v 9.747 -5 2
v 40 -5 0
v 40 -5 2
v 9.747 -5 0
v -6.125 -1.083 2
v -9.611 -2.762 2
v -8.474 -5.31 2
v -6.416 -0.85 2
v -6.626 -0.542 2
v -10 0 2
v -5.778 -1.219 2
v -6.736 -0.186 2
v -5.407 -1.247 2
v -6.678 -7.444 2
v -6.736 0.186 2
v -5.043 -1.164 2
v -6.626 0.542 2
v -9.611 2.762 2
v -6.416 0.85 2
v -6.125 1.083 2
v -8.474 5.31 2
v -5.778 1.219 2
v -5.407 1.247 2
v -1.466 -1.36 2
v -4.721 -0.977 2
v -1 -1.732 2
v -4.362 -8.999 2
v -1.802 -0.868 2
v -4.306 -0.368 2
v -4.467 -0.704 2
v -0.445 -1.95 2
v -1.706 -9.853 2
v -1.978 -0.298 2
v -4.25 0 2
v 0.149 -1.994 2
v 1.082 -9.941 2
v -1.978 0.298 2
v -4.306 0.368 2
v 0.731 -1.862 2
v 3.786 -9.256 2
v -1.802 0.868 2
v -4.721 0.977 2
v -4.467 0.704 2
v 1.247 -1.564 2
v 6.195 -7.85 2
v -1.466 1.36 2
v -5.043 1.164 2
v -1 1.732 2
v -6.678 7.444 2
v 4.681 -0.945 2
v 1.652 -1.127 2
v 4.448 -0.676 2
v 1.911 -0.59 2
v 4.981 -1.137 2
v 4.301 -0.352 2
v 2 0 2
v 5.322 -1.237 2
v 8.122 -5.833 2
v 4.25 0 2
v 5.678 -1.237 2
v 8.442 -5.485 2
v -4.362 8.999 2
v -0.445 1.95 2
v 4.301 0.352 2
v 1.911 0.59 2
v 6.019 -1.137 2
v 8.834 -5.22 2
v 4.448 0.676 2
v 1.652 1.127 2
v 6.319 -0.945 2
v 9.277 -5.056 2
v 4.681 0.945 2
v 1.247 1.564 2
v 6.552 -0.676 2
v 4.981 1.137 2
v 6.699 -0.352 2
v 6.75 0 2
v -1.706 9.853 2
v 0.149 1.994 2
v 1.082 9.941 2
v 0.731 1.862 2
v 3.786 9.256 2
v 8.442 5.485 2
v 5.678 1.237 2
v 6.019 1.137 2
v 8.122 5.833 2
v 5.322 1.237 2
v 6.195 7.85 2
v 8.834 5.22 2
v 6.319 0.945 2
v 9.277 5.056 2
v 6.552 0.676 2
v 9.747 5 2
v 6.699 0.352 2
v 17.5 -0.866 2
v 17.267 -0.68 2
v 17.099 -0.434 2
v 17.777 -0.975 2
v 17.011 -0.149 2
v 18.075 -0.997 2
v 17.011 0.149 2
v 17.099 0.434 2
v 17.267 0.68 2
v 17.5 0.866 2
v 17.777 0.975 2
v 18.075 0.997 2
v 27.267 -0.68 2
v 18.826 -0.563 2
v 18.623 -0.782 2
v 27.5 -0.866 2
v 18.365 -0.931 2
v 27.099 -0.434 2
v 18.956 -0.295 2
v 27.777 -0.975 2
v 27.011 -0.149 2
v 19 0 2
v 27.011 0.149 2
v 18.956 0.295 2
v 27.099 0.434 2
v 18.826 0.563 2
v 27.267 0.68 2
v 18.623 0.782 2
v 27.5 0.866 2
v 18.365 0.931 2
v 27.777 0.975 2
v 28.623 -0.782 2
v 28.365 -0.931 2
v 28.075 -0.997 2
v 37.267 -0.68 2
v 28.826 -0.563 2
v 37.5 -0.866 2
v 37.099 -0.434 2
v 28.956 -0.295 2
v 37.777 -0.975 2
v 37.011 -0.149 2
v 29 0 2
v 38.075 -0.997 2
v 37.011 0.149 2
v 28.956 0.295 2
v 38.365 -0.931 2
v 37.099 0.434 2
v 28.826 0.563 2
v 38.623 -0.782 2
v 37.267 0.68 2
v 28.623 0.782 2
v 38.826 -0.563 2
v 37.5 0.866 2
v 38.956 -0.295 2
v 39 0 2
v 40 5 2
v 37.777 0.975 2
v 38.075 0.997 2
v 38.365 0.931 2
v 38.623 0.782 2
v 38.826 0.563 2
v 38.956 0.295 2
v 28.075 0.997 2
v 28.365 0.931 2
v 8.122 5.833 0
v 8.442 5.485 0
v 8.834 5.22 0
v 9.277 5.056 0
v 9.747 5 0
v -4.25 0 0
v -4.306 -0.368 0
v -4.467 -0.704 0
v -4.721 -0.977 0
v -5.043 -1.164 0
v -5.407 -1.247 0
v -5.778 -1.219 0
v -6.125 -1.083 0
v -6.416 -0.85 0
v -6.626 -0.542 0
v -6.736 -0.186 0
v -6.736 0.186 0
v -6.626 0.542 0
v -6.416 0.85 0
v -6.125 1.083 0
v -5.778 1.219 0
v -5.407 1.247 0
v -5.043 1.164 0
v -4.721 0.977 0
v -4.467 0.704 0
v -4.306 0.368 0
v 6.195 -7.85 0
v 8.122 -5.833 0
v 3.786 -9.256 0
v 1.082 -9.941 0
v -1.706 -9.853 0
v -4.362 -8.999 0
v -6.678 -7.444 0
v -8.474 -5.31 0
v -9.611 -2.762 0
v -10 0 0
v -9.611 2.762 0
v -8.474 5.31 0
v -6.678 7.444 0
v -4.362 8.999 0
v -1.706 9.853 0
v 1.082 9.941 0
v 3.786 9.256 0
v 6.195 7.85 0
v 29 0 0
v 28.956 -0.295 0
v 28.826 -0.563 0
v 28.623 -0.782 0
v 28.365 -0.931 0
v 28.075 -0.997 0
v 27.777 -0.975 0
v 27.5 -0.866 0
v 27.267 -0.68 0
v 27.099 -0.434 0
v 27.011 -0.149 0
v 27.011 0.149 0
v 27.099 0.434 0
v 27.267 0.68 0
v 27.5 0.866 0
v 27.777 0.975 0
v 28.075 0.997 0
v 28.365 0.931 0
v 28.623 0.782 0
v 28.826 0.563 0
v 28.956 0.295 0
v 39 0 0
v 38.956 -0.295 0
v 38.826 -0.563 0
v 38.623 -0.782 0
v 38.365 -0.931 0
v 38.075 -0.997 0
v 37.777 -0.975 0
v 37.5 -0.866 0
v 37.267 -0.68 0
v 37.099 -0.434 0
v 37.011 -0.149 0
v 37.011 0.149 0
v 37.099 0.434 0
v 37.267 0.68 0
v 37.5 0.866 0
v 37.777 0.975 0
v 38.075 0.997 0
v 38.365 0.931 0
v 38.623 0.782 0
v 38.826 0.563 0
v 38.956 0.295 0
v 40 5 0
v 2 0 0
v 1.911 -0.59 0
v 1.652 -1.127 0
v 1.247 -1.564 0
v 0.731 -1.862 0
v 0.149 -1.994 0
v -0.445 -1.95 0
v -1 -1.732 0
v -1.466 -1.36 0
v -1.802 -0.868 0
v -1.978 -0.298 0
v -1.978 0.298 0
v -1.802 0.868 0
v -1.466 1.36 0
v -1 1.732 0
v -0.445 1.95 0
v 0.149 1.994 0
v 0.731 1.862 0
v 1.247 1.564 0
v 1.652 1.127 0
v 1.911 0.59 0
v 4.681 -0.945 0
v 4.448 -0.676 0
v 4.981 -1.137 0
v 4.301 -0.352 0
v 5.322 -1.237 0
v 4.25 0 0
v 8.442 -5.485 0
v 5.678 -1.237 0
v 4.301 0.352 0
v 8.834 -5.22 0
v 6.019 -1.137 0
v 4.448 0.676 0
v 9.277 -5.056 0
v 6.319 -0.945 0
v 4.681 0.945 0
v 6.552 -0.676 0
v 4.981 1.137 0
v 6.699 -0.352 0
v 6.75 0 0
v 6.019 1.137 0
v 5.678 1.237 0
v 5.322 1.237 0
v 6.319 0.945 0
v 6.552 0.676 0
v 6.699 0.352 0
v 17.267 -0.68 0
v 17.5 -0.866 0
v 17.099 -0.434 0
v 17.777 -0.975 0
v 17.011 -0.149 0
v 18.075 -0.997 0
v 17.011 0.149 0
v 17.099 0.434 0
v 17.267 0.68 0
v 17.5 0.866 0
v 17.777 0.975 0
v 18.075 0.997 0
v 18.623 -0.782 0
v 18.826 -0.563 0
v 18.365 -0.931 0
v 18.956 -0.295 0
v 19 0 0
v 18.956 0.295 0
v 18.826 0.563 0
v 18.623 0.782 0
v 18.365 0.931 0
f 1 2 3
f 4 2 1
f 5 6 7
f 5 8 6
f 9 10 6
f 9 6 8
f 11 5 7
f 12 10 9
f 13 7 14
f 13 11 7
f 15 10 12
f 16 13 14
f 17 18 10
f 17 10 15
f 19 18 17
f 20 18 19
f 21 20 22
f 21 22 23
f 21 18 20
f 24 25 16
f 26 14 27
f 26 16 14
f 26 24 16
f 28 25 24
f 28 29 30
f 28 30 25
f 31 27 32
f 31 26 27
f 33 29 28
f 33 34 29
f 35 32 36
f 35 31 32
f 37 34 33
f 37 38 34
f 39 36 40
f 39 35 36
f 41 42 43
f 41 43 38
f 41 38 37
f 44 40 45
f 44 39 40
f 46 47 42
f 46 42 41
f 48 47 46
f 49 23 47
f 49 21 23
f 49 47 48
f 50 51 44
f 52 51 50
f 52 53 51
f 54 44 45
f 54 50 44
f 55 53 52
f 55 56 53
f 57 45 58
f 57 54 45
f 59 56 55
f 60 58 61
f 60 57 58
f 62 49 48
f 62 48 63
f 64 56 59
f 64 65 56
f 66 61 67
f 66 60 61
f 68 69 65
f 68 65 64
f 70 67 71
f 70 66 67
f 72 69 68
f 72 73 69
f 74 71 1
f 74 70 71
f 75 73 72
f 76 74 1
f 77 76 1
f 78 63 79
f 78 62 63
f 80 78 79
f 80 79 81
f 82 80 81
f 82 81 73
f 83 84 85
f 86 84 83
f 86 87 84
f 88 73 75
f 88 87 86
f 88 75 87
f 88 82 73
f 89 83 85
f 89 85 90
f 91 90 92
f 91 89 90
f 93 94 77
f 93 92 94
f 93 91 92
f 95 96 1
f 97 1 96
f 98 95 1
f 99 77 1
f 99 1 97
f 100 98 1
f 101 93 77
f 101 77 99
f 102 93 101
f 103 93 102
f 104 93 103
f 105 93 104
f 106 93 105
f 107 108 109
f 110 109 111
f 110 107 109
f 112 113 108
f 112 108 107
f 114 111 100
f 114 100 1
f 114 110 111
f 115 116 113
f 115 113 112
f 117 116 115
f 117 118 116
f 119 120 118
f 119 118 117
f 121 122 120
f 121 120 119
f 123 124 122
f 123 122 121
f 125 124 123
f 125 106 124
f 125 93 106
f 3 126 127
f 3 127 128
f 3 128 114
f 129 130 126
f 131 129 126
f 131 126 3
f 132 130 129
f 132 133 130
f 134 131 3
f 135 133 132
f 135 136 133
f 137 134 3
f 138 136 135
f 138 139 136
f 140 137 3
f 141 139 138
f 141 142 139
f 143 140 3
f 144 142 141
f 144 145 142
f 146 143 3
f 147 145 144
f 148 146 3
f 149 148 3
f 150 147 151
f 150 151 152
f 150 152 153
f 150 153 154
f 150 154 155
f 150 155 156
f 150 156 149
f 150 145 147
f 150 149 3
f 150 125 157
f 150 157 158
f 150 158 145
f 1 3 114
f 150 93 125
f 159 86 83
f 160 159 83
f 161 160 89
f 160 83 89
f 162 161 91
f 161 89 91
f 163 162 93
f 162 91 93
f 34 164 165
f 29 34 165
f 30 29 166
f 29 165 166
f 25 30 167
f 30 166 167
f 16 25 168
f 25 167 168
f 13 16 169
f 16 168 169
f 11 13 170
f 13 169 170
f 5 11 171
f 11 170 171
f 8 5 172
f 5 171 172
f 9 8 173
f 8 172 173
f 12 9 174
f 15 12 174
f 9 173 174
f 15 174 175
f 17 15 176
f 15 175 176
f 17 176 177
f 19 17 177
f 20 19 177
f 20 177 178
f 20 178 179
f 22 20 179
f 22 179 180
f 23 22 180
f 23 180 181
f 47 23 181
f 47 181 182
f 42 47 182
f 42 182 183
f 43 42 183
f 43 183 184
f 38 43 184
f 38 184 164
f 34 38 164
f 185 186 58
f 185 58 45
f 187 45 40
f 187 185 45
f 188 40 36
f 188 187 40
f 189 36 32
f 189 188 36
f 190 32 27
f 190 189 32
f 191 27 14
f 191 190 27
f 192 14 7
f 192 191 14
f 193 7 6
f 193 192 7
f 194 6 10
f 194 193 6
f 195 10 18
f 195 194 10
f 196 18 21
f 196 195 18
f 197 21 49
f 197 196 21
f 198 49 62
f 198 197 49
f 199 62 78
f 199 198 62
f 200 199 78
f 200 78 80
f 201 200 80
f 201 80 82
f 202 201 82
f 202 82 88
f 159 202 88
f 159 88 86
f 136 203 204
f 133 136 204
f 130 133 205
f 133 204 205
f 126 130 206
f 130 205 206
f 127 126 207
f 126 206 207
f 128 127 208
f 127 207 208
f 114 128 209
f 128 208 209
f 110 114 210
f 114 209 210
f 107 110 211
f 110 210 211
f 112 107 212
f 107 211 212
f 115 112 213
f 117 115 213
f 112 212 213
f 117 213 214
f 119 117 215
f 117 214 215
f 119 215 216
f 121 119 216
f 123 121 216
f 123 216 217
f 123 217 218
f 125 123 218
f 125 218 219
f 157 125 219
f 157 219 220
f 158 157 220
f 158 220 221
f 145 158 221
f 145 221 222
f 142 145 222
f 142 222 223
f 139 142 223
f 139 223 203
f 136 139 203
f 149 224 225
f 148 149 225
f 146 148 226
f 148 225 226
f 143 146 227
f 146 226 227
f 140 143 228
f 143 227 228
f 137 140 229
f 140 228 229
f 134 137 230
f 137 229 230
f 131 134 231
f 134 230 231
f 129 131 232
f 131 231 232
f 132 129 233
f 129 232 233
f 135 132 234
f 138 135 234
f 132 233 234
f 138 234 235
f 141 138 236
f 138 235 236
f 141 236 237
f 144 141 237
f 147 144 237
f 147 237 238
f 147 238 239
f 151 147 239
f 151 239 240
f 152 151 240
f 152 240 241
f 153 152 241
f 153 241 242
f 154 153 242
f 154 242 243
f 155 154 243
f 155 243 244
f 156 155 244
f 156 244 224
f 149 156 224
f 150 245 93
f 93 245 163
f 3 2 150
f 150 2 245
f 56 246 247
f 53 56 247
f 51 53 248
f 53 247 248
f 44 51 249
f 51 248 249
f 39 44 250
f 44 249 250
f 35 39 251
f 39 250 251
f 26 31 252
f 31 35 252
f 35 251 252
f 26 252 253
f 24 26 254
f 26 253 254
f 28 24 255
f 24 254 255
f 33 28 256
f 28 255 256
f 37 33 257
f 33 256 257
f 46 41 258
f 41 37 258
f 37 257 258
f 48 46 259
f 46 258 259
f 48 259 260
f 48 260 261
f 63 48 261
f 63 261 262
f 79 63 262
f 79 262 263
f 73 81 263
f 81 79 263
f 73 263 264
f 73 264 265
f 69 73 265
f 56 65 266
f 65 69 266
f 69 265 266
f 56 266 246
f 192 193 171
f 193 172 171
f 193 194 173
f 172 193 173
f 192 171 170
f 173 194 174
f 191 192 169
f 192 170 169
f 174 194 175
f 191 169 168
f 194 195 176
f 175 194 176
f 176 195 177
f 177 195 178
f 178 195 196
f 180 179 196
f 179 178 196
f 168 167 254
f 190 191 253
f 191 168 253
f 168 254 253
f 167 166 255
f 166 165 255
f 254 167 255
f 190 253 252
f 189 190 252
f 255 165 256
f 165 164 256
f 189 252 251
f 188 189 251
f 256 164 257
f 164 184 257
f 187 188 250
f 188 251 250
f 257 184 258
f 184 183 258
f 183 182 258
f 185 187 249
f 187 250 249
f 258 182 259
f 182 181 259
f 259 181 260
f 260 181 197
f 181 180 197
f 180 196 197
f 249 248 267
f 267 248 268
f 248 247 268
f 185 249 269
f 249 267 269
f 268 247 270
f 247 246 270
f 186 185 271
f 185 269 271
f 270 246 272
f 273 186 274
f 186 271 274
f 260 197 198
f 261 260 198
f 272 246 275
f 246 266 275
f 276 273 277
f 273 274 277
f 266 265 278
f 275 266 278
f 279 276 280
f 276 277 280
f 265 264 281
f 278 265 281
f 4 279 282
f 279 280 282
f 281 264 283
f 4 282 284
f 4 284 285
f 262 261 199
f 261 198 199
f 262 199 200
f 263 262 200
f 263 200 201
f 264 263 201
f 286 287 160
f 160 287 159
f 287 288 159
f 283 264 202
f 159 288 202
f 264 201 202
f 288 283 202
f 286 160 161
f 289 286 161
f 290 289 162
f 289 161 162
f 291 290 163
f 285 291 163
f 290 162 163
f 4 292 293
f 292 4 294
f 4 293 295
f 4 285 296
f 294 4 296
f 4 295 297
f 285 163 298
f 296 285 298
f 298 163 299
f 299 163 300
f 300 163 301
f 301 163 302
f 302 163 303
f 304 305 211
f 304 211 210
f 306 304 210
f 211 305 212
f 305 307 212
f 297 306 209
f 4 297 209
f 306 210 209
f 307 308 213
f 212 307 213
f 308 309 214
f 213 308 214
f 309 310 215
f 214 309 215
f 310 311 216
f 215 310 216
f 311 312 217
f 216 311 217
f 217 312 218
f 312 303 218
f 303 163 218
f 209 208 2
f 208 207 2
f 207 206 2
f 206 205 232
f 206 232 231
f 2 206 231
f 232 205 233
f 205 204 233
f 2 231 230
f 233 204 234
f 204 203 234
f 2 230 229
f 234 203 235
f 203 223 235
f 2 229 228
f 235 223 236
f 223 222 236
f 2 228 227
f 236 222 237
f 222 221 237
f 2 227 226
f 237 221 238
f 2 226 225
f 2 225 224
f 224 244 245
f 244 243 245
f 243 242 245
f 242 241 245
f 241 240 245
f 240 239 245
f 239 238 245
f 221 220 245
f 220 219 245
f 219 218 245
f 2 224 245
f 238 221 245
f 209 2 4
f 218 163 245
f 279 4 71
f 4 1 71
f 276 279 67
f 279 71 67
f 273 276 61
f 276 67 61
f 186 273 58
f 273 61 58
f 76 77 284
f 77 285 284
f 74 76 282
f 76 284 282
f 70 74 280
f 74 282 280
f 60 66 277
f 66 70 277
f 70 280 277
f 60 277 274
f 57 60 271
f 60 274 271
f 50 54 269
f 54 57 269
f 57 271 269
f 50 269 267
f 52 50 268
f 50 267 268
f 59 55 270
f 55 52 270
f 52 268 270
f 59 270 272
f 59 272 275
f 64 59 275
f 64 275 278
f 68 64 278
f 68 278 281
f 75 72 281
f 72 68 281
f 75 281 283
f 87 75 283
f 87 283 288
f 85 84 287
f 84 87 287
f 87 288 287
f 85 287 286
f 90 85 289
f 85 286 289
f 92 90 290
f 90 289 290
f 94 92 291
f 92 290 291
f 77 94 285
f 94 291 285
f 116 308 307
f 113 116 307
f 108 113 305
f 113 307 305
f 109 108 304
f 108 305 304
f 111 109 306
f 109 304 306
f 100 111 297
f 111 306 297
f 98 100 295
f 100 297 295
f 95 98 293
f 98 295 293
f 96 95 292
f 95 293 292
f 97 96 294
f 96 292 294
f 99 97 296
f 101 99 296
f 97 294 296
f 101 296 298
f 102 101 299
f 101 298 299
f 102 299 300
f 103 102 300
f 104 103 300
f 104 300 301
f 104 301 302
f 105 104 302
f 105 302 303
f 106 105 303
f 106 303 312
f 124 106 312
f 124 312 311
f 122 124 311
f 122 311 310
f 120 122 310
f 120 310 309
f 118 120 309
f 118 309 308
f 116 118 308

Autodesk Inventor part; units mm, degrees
ref_plane "YZ Plane" through (0, 0, 0) normal (1, 0, 0) x (0, 1, 0)
ref_plane "XZ Plane" through (0, 0, 0) normal (0, 1, 0) x (-1, 0, 0)
ref_plane "XY Plane" through (0, 0, 0) normal (0, 0, 1) x (1, 0, 0)
sketch "スケッチ5" plane through (0, 0, 0) normal (0, 0, 1) x (1, 0, 0)
  circle A0 centre (0, 0) radius 2
  circle A1 centre (0, 0) radius 10
  line L0 (0, 0) -> (40, 0)
  line L1 (40, 0) -> (40, -5)
  line L2 (40, -5) -> (8.6603, -5)
  line L3 (40, 0) -> (40, 5)
  line L4 (40, 5) -> (8.6603, 5)
  circle A2 centre (18, 0) radius 1
  circle A3 centre (28, 0) radius 1
  circle A4 centre (38, 0) radius 1
  circle A5 centre (0, 0) radius 5.5
  circle A6 centre (-5.5, 0) radius 1.25
  circle A7 centre (5.5, 0) radius 1.25
  dimension "d31" = 4
  dimension "d32" = 20
  dimension "d33" = 40
  dimension "d34" = 5
  dimension "d35" = 5
  dimension "d36" = 2
  dimension "d37" = 2
  dimension "d38" = 2
  dimension "d39" = 11
  dimension "d40" = 2.5
  dimension "d41" = 2.5
extrude "押し出し5" add sketch "スケッチ5" along normal blind 2 contours A7 A5 A6 | A1 | A1 L4 L3 L0 A4 A3 A2 | L0 A2 A3 A4 L1 L2 A1
fillet "フィレット2" radius 2 2 edges at (8.6603, 5, 1) (8.6603, -5, 1)
properties part number "cutter_board" material "ABS プラスチック"
